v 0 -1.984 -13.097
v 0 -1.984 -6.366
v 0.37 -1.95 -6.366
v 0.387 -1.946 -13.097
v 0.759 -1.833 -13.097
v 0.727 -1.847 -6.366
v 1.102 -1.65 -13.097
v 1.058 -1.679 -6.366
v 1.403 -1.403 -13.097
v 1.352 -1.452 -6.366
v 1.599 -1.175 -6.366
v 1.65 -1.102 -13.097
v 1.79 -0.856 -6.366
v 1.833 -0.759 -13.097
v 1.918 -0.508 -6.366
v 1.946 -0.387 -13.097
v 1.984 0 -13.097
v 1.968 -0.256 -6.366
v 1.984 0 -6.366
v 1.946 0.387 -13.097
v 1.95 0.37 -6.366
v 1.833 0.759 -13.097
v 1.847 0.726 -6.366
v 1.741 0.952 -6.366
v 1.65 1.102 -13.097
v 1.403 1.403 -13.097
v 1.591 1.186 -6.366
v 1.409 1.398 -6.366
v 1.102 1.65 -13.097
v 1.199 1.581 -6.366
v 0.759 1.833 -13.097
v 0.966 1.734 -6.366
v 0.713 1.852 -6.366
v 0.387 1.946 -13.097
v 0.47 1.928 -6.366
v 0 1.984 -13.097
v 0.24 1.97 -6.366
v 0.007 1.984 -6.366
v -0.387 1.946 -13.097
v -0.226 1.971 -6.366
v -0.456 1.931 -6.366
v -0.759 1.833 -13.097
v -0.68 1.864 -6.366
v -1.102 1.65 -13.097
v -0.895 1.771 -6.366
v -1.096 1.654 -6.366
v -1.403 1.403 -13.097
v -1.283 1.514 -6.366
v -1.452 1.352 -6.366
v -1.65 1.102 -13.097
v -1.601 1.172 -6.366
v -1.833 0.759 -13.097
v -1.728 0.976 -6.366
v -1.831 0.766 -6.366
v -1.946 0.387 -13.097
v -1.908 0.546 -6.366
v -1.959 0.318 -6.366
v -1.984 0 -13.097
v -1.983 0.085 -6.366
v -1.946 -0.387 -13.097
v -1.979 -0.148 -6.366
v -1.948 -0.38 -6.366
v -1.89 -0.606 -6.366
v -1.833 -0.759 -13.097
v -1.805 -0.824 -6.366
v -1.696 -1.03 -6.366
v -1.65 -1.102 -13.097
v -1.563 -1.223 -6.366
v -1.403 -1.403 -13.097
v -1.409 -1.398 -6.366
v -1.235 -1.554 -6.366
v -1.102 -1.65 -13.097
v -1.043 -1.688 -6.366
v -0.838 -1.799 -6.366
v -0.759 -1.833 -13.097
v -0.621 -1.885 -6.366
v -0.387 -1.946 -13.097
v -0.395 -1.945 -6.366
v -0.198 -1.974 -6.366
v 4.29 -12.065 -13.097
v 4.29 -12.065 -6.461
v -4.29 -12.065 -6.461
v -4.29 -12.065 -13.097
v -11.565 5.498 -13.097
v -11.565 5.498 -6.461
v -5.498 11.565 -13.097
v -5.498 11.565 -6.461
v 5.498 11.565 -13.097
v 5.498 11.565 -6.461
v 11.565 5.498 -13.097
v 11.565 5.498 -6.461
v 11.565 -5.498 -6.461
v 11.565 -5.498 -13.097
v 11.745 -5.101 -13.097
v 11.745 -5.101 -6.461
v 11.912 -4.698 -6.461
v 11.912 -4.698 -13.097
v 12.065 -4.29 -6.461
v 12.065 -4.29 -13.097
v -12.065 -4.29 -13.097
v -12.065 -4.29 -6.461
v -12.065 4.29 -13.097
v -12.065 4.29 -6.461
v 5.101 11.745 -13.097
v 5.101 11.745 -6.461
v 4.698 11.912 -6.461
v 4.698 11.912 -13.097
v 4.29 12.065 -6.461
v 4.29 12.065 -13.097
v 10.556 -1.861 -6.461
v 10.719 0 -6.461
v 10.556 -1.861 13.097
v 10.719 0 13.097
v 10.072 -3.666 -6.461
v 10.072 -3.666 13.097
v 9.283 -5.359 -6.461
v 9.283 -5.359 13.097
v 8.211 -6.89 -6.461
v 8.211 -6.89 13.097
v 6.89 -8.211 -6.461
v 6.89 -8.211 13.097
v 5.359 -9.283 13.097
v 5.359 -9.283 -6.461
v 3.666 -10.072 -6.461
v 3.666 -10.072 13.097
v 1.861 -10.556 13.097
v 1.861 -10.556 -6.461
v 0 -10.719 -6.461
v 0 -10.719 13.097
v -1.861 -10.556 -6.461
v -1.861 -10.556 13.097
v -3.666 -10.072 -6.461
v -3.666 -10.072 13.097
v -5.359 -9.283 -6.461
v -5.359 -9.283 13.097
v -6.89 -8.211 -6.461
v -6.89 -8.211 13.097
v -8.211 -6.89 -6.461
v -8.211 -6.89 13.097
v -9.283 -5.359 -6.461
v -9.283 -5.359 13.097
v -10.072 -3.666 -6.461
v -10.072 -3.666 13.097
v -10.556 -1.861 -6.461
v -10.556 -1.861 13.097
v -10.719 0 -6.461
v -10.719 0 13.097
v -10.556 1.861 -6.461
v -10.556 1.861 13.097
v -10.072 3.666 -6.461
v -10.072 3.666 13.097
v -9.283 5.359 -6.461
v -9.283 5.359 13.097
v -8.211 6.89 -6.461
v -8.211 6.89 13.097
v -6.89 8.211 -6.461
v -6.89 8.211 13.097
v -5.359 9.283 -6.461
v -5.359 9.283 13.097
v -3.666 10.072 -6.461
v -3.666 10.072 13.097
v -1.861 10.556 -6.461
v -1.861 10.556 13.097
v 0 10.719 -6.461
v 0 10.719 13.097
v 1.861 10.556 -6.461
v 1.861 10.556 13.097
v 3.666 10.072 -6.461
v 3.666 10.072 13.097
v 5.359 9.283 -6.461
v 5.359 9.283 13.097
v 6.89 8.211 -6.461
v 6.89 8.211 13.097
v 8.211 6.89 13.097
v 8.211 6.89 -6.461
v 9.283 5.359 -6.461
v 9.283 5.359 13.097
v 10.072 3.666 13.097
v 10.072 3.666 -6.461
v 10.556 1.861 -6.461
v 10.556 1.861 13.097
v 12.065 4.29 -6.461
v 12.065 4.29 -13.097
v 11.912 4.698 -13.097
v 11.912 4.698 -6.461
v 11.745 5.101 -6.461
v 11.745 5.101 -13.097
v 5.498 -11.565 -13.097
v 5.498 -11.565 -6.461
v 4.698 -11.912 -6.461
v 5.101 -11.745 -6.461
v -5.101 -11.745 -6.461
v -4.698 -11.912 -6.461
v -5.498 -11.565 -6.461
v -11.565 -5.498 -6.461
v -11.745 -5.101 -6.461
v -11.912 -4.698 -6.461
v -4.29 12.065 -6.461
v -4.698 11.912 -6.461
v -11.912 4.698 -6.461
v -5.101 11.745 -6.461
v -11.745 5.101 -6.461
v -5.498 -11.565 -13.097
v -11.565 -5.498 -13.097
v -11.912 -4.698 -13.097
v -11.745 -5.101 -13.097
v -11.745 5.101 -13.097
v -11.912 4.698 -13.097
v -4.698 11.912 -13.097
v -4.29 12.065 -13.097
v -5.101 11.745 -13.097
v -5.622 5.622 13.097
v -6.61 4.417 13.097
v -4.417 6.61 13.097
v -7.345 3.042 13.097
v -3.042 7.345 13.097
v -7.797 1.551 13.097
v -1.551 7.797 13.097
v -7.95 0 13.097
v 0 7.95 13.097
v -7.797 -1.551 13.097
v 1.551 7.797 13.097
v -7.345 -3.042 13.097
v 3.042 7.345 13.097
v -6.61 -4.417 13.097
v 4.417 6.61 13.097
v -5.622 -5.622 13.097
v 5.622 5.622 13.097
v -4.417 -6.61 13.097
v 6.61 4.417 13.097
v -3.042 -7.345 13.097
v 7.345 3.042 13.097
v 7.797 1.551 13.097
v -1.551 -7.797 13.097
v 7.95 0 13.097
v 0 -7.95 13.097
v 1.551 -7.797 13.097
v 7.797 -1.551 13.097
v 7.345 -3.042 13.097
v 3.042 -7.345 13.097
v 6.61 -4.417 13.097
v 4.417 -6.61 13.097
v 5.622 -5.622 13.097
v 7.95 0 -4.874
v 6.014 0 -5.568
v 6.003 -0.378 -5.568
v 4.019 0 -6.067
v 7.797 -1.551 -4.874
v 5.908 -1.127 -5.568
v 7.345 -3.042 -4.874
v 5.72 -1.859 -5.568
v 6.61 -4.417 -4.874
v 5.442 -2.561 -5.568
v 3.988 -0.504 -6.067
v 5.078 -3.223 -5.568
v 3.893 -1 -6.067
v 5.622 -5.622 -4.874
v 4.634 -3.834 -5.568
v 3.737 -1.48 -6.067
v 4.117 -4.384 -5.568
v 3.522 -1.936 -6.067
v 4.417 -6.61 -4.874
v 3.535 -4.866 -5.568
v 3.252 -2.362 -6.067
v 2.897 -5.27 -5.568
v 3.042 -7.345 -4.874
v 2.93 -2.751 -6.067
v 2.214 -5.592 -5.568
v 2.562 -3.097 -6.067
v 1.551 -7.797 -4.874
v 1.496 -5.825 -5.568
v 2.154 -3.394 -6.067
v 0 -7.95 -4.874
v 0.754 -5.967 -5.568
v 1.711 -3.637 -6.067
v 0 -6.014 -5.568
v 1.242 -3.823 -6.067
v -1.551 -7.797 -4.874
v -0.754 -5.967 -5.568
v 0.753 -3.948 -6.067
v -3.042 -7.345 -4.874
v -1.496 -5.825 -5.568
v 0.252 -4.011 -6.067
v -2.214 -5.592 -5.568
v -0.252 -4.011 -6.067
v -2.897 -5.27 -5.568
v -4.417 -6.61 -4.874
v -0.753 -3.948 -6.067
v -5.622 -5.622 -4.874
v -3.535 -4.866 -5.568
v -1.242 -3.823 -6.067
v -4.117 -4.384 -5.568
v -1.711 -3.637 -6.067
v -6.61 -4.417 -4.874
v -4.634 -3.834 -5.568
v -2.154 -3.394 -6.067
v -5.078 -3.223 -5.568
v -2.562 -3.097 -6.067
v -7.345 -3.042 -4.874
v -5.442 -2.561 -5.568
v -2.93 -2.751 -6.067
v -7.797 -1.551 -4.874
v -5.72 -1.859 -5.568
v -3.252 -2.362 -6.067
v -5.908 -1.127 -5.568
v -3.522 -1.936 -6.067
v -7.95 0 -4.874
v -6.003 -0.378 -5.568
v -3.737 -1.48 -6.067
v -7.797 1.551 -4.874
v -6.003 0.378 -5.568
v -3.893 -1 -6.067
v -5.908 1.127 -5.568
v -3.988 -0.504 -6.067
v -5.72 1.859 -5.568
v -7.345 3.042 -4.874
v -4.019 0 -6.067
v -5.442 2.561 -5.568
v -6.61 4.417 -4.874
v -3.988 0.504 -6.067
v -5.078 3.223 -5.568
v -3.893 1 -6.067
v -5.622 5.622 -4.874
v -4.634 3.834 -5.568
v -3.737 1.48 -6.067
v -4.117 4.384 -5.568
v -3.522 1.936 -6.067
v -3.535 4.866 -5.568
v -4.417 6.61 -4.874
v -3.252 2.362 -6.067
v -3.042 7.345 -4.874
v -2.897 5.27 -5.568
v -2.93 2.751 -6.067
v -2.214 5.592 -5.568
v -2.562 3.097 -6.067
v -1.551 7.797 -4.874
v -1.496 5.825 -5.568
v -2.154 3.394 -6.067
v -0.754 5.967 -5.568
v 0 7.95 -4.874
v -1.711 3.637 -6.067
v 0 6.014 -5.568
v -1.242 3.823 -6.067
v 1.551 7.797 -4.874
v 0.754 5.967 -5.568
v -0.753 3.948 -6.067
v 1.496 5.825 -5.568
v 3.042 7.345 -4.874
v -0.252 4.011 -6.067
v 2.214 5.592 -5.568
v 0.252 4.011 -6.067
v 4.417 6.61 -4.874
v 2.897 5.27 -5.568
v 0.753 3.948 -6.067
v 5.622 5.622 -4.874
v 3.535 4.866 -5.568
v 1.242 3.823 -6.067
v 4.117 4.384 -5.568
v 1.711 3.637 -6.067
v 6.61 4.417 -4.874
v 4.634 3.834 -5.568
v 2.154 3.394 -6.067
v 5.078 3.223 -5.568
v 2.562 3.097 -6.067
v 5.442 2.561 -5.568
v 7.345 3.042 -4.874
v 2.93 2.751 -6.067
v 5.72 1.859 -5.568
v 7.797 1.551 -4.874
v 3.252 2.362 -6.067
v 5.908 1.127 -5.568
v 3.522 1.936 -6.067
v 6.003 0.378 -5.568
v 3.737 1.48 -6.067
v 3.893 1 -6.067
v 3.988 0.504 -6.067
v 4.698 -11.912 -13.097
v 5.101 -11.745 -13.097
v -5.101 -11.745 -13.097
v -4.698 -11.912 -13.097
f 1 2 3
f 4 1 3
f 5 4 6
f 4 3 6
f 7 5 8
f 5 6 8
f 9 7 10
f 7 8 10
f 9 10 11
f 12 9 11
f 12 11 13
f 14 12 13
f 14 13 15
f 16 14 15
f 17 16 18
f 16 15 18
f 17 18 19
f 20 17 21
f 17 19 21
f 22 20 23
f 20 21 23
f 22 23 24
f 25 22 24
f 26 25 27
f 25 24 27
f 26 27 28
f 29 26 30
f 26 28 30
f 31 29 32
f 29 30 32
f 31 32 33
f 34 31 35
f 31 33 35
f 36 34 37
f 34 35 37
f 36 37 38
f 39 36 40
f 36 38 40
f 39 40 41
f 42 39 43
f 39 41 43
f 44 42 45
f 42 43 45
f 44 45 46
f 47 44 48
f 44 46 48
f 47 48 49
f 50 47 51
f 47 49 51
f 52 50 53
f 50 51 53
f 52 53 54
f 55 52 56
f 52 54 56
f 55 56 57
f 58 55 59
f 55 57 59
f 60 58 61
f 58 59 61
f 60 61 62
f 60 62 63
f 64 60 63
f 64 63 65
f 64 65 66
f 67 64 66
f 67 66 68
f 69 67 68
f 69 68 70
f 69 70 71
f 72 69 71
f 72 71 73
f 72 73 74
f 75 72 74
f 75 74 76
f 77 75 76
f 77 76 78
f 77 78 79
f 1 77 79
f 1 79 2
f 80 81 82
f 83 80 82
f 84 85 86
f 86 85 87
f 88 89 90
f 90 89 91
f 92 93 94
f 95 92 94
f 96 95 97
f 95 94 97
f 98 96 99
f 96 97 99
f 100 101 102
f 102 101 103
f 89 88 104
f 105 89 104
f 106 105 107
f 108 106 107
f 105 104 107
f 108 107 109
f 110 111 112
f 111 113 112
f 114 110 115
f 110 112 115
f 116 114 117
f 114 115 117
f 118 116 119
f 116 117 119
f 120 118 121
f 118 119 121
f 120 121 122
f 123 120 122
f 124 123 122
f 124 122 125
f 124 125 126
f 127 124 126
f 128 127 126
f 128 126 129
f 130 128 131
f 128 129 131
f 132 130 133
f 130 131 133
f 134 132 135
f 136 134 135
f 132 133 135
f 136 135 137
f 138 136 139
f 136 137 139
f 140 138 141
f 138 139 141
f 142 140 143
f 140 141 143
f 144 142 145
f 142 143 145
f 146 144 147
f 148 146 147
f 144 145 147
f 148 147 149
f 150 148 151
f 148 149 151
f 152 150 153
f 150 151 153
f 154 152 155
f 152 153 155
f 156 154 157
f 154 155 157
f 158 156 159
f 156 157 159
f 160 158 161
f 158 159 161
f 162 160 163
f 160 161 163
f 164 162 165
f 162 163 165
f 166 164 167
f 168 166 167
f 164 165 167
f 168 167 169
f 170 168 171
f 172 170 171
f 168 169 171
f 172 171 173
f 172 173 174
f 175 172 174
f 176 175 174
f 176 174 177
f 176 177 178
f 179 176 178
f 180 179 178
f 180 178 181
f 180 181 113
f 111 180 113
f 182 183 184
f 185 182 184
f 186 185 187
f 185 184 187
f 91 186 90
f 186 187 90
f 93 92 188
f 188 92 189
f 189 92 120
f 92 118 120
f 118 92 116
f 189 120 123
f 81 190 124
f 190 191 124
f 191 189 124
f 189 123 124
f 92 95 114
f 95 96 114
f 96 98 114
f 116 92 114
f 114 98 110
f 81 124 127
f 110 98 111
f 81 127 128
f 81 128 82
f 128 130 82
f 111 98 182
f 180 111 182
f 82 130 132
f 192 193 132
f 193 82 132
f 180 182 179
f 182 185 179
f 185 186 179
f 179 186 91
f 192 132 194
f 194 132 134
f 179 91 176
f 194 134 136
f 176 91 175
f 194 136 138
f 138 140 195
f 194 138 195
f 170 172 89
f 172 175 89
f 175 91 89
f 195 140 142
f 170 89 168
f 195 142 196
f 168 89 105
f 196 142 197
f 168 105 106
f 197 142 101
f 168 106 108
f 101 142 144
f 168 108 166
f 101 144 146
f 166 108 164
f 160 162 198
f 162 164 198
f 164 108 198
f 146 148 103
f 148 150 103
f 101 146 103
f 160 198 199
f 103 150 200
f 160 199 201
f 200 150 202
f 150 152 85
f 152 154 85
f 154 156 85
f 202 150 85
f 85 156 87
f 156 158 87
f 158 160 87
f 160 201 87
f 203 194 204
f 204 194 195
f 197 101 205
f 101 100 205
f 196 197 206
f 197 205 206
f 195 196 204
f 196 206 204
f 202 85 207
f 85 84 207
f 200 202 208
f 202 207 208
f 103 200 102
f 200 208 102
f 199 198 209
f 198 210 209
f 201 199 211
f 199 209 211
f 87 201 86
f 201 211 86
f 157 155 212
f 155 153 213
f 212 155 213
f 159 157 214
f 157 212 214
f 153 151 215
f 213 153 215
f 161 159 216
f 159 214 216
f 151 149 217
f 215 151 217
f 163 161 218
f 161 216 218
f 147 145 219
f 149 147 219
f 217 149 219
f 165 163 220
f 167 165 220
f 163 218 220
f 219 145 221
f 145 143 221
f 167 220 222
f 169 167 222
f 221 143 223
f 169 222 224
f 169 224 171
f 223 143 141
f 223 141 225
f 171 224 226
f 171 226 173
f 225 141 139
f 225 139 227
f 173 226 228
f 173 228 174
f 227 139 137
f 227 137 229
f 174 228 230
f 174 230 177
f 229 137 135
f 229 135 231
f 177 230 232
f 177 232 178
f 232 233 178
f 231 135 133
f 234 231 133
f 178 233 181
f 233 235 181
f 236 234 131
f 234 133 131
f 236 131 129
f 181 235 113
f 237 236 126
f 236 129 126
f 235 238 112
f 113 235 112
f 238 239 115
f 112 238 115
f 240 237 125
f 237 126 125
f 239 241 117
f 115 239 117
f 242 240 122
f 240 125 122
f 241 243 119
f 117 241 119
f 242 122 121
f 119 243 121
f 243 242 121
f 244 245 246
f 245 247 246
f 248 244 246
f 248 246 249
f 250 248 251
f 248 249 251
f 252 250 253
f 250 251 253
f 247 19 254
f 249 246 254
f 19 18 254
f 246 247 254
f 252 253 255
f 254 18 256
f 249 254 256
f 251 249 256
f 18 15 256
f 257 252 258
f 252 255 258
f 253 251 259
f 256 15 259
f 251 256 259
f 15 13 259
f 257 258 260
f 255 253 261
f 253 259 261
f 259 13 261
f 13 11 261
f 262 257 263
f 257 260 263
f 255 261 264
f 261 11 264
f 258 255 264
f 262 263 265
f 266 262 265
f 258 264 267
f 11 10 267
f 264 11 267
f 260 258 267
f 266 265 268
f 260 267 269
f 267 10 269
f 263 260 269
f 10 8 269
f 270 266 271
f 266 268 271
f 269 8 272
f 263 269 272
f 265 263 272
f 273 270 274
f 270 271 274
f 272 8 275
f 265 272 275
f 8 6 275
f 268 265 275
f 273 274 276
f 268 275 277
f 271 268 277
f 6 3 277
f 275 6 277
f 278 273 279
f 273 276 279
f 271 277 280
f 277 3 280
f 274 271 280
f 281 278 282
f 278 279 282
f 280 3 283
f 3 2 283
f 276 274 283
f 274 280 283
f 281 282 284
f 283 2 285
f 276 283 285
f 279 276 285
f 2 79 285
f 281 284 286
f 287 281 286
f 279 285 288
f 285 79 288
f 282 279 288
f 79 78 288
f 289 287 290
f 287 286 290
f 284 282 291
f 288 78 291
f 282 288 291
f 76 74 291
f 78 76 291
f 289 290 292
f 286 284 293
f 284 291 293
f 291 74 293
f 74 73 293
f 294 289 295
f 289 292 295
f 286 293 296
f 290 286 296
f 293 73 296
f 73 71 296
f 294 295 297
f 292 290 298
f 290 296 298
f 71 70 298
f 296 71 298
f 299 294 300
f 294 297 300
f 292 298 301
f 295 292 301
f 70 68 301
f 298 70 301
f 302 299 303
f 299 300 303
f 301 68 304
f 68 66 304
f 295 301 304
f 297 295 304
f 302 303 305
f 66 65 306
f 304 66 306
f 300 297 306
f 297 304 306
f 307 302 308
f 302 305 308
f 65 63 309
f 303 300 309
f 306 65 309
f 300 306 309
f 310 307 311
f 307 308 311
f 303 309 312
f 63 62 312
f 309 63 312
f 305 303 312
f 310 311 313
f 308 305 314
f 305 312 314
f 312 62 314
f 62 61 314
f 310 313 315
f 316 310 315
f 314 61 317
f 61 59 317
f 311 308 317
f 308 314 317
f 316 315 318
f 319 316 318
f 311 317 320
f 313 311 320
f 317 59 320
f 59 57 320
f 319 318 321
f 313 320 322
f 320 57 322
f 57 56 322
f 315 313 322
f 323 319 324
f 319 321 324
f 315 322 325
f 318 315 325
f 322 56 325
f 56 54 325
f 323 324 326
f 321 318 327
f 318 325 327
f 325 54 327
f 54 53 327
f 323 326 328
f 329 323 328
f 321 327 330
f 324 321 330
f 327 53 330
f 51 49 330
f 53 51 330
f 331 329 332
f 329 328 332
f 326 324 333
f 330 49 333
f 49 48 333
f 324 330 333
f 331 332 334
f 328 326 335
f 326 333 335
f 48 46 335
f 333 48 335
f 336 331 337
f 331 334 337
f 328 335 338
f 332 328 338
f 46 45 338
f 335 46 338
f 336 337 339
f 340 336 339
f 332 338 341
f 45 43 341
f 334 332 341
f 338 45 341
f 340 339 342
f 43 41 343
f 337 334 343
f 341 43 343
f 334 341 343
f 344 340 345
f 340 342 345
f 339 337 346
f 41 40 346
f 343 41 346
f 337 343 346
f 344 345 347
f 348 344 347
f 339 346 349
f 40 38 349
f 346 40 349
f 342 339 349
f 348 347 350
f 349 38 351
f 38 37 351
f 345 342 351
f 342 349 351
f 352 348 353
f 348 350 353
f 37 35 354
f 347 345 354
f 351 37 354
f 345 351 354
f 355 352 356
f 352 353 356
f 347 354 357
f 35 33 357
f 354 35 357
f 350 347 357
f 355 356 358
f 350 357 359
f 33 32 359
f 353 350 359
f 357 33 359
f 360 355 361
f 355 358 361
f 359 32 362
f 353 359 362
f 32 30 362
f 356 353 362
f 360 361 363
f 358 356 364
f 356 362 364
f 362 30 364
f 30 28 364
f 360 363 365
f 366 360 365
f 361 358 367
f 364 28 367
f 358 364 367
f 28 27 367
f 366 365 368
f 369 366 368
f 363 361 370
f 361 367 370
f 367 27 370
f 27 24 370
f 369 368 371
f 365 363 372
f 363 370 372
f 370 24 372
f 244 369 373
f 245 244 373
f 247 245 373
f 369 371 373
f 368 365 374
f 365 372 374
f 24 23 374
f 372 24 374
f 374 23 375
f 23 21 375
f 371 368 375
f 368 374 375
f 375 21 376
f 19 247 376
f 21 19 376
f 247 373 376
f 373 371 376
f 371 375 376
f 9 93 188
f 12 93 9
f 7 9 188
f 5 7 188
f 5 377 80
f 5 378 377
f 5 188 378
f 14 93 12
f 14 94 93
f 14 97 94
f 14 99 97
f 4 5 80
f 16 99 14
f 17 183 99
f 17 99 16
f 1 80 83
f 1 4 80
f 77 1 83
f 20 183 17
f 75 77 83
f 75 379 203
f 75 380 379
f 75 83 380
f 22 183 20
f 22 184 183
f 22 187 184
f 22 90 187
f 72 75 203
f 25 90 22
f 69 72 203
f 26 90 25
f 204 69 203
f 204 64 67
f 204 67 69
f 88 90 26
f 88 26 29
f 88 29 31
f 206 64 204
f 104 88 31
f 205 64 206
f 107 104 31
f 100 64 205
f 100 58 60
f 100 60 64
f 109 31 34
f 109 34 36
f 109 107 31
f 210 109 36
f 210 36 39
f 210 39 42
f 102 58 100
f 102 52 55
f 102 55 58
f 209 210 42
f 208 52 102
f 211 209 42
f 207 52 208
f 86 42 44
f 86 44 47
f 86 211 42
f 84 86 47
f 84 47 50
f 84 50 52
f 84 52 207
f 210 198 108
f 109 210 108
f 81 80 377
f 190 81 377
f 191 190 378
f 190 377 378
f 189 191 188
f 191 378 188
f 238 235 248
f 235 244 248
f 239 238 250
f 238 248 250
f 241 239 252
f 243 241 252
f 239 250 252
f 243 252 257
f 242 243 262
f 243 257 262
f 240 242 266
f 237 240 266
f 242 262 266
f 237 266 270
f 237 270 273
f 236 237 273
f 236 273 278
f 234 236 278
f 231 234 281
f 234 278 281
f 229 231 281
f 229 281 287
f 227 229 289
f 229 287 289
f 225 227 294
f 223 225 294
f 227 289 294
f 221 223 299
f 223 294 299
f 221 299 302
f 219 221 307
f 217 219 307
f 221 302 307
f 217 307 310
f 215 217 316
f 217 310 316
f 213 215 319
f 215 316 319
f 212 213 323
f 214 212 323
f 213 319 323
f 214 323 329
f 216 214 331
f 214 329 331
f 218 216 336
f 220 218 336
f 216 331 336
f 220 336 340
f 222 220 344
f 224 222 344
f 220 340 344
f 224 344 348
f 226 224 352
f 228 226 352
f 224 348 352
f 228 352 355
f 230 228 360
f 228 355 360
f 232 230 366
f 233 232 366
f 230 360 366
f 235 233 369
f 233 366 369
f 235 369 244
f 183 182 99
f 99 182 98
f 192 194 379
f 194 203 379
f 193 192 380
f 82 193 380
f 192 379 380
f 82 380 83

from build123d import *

# Parameters (mm, degrees)
BOSS_EXTRUDE1_START = -6.63575
SKETCH4_R           = 10.7188
BOSS_EXTRUDE1_DEPTH = 6.63575
SKETCH5_W           = 6.63575
SKETCH5_H           = 0.254
CUT_EXTRUDE1_START  = 26.19375
SKETCH6_R           = 1.984375
CUT_EXTRUDE1_DEPTH  = 50.8


with BuildPart() as part:
    # Sketch3 → Revolve1 (revolve)
    with BuildSketch(Plane(origin=(0, 0, 0), x_dir=(0, 0, -1), z_dir=(1, 0, 0)), mode=Mode.PRIVATE) as revolve1_sk:
        with BuildLine():
            Line((6.461125, 0), (13.096875, 0))
            Line((13.096875, 0), (13.096875, -10.7188))
            Line((13.096875, -10.7188), (-13.096875, -10.7188))
            Line((-13.096875, -10.7188), (-13.096875, -7.9502))
            Line((-13.096875, -7.9502), (4.873625, -7.9502))
            ThreePointArc((4.873625, -7.9502), (6.060370876, -4.053573618), (6.461125, 0))
        make_face()
    revolve(revolve1_sk.sketch.rotate(Axis((0, 0, 13.096875), (0, 0, -1)), 270), axis=Axis((0, 0, 13.096875), (0, 0, -1)))

    # Sketch4 → Boss-Extrude1 (add)
    with BuildSketch(Plane(origin=(0, 0, -13.096875), x_dir=(-1, 0, 0), z_dir=(0, 0, -1)).offset(BOSS_EXTRUDE1_START)):
        Polygon((4.99748663, 12.065), (-4.99748663, 12.065), (-12.065, 4.99748663), (-12.065, -4.99748663), (-4.99748663, -12.065), (4.99748663, -12.065), (12.065, -4.99748663), (12.065, 4.99748663), align=None)
        with Locations(Location((0, 0, 0), (0, 0, 180))):
            Circle(SKETCH4_R, mode=Mode.SUBTRACT)
    extrude(amount=BOSS_EXTRUDE1_DEPTH)

    # Sketch5 → Cut-Revolve1 (revolve, cut)
    with BuildSketch(Plane(origin=(0, 0, 0), x_dir=(0, 0, -1), z_dir=(0.9238795325112871, -0.3826834323650893, 0)), mode=Mode.PRIVATE) as cut_revolve1_sk:
        with Locations((9.779, 12.932061897)):
            Rectangle(SKETCH5_W, SKETCH5_H)
    revolve(cut_revolve1_sk.sketch.rotate(Axis((0, 0, 13.096875), (0, 0, 1)), 202.5), axis=Axis((0, 0, 13.096875), (0, 0, 1)), mode=Mode.SUBTRACT)

    # Sketch6 → Cut-Extrude1 (cut)
    with BuildSketch(Plane(origin=(-8.103148128, -57.606298873, -13.096875), x_dir=(1, 0, 0), z_dir=(0, 0, 1)).offset(CUT_EXTRUDE1_START)):
        with Locations(Location((8.103148128, 57.606298873, 0), (0, 0, 270))):
            Circle(SKETCH6_R)
    extrude(amount=-CUT_EXTRUDE1_DEPTH, mode=Mode.SUBTRACT)


solid = part.part
